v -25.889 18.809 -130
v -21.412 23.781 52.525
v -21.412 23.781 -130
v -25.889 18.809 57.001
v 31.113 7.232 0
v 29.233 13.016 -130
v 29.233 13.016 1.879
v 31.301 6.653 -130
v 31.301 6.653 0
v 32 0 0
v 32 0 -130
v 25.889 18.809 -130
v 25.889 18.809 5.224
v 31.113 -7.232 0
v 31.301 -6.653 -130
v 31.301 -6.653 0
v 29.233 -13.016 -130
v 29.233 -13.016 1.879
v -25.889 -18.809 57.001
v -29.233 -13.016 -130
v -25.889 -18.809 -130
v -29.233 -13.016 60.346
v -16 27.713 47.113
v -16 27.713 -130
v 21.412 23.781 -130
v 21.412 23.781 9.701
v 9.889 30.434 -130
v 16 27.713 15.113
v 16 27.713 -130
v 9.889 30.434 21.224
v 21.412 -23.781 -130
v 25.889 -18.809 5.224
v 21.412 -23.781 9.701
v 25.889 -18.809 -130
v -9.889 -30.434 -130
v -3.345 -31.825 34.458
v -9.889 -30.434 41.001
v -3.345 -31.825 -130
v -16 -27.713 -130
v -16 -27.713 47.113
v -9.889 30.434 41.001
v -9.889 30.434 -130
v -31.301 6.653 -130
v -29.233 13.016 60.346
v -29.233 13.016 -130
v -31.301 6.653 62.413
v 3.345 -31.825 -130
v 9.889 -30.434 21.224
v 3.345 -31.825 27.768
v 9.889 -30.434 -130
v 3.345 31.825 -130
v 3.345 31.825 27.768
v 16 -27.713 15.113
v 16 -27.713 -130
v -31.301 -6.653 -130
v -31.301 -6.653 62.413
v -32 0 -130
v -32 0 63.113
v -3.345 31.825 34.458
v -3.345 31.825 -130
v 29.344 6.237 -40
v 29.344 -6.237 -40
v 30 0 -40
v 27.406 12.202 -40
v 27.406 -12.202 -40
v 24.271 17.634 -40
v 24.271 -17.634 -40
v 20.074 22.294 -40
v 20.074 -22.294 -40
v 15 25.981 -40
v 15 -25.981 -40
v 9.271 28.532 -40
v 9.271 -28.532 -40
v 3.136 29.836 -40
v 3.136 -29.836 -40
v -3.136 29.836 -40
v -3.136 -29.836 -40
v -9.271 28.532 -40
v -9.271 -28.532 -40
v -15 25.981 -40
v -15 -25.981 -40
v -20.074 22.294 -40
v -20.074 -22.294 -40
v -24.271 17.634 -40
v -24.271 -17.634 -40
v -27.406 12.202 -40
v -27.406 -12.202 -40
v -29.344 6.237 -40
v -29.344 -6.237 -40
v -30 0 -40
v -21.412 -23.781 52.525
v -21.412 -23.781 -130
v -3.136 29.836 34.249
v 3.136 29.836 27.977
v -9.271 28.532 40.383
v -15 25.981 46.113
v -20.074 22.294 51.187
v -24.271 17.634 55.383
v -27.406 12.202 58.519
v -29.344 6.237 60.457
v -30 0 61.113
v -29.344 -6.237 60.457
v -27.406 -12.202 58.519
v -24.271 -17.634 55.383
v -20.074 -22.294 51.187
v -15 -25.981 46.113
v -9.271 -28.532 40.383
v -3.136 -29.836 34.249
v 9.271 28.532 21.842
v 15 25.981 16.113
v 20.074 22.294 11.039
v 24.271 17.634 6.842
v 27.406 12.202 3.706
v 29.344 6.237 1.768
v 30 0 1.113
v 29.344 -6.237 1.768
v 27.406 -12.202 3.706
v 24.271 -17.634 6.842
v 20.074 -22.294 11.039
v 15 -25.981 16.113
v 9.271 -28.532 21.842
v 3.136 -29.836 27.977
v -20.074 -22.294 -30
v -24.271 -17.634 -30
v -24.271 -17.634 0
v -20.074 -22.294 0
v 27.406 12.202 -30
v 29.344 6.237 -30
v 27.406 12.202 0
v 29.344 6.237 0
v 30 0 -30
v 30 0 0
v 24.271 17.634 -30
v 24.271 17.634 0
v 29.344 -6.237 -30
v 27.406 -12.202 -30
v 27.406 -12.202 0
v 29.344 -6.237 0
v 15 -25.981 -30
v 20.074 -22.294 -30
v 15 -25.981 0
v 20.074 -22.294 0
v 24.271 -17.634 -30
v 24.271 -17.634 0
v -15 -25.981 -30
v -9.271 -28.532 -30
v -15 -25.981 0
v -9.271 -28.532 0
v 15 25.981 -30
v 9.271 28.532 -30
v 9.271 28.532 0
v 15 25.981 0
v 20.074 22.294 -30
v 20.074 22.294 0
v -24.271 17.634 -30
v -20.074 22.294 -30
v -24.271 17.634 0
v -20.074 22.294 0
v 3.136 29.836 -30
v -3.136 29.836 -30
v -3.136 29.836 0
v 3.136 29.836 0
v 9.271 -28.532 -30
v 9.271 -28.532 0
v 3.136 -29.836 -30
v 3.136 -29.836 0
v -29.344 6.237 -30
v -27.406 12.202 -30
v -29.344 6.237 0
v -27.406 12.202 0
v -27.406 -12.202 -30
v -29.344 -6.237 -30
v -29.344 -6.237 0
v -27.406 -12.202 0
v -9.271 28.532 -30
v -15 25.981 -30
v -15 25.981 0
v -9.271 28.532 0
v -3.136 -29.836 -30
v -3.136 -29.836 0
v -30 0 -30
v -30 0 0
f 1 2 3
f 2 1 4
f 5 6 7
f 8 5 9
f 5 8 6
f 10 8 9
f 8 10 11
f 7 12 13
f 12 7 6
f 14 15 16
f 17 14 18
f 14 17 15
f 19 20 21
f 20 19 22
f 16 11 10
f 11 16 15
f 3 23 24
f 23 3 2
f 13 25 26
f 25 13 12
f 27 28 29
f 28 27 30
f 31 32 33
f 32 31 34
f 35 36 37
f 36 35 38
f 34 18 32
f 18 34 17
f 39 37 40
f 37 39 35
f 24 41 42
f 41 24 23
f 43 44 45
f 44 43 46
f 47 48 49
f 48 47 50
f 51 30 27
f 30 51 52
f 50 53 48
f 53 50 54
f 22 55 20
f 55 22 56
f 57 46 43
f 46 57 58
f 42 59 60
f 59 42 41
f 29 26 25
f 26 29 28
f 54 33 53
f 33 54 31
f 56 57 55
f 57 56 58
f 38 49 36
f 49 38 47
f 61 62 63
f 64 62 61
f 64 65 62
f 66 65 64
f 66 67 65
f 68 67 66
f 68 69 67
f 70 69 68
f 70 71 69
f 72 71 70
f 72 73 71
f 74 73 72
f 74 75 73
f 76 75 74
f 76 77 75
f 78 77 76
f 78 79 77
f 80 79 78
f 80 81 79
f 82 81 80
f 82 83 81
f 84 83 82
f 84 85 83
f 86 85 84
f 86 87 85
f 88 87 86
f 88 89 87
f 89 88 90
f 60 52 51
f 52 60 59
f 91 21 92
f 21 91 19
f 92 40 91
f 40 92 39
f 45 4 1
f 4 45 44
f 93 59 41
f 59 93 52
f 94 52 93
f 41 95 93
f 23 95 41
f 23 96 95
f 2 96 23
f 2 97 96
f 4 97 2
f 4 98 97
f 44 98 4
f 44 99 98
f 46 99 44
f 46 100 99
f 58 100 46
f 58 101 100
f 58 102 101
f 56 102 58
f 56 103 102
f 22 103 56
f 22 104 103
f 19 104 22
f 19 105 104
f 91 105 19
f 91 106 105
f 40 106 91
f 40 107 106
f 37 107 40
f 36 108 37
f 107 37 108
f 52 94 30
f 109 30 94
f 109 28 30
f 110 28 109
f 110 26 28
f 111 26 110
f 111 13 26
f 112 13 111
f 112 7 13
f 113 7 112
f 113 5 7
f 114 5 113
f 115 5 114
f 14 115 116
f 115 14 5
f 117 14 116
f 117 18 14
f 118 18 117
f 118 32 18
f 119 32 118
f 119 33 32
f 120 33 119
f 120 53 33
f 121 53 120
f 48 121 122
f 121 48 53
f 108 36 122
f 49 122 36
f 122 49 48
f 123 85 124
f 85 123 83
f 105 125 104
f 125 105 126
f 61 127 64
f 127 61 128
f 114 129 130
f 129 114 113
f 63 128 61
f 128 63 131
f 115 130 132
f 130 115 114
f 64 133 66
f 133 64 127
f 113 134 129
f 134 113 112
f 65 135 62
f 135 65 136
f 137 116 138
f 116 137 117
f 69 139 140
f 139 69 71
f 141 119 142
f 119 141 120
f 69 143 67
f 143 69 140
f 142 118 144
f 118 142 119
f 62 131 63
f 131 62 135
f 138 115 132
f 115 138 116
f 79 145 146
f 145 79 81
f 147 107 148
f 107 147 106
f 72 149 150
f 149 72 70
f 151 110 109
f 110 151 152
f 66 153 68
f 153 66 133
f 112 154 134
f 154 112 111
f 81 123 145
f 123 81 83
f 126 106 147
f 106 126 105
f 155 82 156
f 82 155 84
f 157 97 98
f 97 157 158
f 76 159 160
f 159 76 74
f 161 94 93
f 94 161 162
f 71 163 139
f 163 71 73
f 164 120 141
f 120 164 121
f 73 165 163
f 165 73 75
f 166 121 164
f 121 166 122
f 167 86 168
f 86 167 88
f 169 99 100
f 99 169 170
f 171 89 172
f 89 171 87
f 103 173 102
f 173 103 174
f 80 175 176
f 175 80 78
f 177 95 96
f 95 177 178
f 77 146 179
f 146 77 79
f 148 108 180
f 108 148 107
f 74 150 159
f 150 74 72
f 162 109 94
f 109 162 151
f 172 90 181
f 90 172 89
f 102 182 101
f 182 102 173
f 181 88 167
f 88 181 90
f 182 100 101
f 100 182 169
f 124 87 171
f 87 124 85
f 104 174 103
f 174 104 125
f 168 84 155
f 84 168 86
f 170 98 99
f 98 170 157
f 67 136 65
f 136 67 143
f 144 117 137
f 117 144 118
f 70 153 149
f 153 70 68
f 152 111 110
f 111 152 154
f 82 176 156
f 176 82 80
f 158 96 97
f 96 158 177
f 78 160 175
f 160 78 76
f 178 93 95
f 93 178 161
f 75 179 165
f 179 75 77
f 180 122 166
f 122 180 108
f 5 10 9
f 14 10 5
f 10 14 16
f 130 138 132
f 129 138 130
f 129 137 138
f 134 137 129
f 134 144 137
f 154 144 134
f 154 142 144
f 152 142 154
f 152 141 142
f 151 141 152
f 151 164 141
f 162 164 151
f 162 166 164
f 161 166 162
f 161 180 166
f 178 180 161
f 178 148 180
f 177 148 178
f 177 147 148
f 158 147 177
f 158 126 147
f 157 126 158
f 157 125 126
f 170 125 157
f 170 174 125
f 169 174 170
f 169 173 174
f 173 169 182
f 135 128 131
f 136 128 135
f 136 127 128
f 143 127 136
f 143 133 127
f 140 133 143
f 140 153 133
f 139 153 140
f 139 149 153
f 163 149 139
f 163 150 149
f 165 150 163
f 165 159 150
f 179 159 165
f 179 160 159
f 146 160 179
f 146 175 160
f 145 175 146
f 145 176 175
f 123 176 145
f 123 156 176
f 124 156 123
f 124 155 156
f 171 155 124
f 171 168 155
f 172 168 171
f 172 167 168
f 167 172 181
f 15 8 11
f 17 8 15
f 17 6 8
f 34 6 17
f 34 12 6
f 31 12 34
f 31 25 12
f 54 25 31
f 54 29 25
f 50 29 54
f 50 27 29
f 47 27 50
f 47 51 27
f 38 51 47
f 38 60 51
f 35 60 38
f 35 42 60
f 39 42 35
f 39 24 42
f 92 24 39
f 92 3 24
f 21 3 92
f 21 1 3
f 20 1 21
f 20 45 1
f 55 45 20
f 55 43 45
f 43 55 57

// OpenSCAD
module venturi();
    {
    difference() {
            translate([0,0,-40]) cylinder(r=32,h=130,center=false);
            rotate([0,45,0]) translate([-90,-70,22]) cube(180);
            translate([0,0,-40]) cylinder(r=30,h=130,center=false);
    }
    translate([0,0,-30]) cylinder(r=32,h=30,center=false);
    translate([0,0,-60]) cylinder(r1=8,r2=32,h=20,center=false);
    translate([0,0,-90]) cylinder(r=8,h=30,center=false);
    translate([0,0,-100]) cylinder(r1=32,r2=8,h=20,center=false);
    translate([0,0,-100]) cylinder(r1=30,r2=6,h=20,center=false);
    translate([0,0,-130]) cylinder(r=32,h=30,center=false);
    translate([0,0,-130]) cylinder(r=30,h=30,center=false);
        difference() {
            translate([0,0,-260]) cylinder(r=32,h=130,center=false);
            translate([-90,-70,-252]) rotate([0,45,0]) cube(180);
            translate([0,0,-260]) cylinder(r=32,h=130,center=false);
}
                #translate([0,0,-110]) cylinder(r=32,h=70);
    }


venturi();
